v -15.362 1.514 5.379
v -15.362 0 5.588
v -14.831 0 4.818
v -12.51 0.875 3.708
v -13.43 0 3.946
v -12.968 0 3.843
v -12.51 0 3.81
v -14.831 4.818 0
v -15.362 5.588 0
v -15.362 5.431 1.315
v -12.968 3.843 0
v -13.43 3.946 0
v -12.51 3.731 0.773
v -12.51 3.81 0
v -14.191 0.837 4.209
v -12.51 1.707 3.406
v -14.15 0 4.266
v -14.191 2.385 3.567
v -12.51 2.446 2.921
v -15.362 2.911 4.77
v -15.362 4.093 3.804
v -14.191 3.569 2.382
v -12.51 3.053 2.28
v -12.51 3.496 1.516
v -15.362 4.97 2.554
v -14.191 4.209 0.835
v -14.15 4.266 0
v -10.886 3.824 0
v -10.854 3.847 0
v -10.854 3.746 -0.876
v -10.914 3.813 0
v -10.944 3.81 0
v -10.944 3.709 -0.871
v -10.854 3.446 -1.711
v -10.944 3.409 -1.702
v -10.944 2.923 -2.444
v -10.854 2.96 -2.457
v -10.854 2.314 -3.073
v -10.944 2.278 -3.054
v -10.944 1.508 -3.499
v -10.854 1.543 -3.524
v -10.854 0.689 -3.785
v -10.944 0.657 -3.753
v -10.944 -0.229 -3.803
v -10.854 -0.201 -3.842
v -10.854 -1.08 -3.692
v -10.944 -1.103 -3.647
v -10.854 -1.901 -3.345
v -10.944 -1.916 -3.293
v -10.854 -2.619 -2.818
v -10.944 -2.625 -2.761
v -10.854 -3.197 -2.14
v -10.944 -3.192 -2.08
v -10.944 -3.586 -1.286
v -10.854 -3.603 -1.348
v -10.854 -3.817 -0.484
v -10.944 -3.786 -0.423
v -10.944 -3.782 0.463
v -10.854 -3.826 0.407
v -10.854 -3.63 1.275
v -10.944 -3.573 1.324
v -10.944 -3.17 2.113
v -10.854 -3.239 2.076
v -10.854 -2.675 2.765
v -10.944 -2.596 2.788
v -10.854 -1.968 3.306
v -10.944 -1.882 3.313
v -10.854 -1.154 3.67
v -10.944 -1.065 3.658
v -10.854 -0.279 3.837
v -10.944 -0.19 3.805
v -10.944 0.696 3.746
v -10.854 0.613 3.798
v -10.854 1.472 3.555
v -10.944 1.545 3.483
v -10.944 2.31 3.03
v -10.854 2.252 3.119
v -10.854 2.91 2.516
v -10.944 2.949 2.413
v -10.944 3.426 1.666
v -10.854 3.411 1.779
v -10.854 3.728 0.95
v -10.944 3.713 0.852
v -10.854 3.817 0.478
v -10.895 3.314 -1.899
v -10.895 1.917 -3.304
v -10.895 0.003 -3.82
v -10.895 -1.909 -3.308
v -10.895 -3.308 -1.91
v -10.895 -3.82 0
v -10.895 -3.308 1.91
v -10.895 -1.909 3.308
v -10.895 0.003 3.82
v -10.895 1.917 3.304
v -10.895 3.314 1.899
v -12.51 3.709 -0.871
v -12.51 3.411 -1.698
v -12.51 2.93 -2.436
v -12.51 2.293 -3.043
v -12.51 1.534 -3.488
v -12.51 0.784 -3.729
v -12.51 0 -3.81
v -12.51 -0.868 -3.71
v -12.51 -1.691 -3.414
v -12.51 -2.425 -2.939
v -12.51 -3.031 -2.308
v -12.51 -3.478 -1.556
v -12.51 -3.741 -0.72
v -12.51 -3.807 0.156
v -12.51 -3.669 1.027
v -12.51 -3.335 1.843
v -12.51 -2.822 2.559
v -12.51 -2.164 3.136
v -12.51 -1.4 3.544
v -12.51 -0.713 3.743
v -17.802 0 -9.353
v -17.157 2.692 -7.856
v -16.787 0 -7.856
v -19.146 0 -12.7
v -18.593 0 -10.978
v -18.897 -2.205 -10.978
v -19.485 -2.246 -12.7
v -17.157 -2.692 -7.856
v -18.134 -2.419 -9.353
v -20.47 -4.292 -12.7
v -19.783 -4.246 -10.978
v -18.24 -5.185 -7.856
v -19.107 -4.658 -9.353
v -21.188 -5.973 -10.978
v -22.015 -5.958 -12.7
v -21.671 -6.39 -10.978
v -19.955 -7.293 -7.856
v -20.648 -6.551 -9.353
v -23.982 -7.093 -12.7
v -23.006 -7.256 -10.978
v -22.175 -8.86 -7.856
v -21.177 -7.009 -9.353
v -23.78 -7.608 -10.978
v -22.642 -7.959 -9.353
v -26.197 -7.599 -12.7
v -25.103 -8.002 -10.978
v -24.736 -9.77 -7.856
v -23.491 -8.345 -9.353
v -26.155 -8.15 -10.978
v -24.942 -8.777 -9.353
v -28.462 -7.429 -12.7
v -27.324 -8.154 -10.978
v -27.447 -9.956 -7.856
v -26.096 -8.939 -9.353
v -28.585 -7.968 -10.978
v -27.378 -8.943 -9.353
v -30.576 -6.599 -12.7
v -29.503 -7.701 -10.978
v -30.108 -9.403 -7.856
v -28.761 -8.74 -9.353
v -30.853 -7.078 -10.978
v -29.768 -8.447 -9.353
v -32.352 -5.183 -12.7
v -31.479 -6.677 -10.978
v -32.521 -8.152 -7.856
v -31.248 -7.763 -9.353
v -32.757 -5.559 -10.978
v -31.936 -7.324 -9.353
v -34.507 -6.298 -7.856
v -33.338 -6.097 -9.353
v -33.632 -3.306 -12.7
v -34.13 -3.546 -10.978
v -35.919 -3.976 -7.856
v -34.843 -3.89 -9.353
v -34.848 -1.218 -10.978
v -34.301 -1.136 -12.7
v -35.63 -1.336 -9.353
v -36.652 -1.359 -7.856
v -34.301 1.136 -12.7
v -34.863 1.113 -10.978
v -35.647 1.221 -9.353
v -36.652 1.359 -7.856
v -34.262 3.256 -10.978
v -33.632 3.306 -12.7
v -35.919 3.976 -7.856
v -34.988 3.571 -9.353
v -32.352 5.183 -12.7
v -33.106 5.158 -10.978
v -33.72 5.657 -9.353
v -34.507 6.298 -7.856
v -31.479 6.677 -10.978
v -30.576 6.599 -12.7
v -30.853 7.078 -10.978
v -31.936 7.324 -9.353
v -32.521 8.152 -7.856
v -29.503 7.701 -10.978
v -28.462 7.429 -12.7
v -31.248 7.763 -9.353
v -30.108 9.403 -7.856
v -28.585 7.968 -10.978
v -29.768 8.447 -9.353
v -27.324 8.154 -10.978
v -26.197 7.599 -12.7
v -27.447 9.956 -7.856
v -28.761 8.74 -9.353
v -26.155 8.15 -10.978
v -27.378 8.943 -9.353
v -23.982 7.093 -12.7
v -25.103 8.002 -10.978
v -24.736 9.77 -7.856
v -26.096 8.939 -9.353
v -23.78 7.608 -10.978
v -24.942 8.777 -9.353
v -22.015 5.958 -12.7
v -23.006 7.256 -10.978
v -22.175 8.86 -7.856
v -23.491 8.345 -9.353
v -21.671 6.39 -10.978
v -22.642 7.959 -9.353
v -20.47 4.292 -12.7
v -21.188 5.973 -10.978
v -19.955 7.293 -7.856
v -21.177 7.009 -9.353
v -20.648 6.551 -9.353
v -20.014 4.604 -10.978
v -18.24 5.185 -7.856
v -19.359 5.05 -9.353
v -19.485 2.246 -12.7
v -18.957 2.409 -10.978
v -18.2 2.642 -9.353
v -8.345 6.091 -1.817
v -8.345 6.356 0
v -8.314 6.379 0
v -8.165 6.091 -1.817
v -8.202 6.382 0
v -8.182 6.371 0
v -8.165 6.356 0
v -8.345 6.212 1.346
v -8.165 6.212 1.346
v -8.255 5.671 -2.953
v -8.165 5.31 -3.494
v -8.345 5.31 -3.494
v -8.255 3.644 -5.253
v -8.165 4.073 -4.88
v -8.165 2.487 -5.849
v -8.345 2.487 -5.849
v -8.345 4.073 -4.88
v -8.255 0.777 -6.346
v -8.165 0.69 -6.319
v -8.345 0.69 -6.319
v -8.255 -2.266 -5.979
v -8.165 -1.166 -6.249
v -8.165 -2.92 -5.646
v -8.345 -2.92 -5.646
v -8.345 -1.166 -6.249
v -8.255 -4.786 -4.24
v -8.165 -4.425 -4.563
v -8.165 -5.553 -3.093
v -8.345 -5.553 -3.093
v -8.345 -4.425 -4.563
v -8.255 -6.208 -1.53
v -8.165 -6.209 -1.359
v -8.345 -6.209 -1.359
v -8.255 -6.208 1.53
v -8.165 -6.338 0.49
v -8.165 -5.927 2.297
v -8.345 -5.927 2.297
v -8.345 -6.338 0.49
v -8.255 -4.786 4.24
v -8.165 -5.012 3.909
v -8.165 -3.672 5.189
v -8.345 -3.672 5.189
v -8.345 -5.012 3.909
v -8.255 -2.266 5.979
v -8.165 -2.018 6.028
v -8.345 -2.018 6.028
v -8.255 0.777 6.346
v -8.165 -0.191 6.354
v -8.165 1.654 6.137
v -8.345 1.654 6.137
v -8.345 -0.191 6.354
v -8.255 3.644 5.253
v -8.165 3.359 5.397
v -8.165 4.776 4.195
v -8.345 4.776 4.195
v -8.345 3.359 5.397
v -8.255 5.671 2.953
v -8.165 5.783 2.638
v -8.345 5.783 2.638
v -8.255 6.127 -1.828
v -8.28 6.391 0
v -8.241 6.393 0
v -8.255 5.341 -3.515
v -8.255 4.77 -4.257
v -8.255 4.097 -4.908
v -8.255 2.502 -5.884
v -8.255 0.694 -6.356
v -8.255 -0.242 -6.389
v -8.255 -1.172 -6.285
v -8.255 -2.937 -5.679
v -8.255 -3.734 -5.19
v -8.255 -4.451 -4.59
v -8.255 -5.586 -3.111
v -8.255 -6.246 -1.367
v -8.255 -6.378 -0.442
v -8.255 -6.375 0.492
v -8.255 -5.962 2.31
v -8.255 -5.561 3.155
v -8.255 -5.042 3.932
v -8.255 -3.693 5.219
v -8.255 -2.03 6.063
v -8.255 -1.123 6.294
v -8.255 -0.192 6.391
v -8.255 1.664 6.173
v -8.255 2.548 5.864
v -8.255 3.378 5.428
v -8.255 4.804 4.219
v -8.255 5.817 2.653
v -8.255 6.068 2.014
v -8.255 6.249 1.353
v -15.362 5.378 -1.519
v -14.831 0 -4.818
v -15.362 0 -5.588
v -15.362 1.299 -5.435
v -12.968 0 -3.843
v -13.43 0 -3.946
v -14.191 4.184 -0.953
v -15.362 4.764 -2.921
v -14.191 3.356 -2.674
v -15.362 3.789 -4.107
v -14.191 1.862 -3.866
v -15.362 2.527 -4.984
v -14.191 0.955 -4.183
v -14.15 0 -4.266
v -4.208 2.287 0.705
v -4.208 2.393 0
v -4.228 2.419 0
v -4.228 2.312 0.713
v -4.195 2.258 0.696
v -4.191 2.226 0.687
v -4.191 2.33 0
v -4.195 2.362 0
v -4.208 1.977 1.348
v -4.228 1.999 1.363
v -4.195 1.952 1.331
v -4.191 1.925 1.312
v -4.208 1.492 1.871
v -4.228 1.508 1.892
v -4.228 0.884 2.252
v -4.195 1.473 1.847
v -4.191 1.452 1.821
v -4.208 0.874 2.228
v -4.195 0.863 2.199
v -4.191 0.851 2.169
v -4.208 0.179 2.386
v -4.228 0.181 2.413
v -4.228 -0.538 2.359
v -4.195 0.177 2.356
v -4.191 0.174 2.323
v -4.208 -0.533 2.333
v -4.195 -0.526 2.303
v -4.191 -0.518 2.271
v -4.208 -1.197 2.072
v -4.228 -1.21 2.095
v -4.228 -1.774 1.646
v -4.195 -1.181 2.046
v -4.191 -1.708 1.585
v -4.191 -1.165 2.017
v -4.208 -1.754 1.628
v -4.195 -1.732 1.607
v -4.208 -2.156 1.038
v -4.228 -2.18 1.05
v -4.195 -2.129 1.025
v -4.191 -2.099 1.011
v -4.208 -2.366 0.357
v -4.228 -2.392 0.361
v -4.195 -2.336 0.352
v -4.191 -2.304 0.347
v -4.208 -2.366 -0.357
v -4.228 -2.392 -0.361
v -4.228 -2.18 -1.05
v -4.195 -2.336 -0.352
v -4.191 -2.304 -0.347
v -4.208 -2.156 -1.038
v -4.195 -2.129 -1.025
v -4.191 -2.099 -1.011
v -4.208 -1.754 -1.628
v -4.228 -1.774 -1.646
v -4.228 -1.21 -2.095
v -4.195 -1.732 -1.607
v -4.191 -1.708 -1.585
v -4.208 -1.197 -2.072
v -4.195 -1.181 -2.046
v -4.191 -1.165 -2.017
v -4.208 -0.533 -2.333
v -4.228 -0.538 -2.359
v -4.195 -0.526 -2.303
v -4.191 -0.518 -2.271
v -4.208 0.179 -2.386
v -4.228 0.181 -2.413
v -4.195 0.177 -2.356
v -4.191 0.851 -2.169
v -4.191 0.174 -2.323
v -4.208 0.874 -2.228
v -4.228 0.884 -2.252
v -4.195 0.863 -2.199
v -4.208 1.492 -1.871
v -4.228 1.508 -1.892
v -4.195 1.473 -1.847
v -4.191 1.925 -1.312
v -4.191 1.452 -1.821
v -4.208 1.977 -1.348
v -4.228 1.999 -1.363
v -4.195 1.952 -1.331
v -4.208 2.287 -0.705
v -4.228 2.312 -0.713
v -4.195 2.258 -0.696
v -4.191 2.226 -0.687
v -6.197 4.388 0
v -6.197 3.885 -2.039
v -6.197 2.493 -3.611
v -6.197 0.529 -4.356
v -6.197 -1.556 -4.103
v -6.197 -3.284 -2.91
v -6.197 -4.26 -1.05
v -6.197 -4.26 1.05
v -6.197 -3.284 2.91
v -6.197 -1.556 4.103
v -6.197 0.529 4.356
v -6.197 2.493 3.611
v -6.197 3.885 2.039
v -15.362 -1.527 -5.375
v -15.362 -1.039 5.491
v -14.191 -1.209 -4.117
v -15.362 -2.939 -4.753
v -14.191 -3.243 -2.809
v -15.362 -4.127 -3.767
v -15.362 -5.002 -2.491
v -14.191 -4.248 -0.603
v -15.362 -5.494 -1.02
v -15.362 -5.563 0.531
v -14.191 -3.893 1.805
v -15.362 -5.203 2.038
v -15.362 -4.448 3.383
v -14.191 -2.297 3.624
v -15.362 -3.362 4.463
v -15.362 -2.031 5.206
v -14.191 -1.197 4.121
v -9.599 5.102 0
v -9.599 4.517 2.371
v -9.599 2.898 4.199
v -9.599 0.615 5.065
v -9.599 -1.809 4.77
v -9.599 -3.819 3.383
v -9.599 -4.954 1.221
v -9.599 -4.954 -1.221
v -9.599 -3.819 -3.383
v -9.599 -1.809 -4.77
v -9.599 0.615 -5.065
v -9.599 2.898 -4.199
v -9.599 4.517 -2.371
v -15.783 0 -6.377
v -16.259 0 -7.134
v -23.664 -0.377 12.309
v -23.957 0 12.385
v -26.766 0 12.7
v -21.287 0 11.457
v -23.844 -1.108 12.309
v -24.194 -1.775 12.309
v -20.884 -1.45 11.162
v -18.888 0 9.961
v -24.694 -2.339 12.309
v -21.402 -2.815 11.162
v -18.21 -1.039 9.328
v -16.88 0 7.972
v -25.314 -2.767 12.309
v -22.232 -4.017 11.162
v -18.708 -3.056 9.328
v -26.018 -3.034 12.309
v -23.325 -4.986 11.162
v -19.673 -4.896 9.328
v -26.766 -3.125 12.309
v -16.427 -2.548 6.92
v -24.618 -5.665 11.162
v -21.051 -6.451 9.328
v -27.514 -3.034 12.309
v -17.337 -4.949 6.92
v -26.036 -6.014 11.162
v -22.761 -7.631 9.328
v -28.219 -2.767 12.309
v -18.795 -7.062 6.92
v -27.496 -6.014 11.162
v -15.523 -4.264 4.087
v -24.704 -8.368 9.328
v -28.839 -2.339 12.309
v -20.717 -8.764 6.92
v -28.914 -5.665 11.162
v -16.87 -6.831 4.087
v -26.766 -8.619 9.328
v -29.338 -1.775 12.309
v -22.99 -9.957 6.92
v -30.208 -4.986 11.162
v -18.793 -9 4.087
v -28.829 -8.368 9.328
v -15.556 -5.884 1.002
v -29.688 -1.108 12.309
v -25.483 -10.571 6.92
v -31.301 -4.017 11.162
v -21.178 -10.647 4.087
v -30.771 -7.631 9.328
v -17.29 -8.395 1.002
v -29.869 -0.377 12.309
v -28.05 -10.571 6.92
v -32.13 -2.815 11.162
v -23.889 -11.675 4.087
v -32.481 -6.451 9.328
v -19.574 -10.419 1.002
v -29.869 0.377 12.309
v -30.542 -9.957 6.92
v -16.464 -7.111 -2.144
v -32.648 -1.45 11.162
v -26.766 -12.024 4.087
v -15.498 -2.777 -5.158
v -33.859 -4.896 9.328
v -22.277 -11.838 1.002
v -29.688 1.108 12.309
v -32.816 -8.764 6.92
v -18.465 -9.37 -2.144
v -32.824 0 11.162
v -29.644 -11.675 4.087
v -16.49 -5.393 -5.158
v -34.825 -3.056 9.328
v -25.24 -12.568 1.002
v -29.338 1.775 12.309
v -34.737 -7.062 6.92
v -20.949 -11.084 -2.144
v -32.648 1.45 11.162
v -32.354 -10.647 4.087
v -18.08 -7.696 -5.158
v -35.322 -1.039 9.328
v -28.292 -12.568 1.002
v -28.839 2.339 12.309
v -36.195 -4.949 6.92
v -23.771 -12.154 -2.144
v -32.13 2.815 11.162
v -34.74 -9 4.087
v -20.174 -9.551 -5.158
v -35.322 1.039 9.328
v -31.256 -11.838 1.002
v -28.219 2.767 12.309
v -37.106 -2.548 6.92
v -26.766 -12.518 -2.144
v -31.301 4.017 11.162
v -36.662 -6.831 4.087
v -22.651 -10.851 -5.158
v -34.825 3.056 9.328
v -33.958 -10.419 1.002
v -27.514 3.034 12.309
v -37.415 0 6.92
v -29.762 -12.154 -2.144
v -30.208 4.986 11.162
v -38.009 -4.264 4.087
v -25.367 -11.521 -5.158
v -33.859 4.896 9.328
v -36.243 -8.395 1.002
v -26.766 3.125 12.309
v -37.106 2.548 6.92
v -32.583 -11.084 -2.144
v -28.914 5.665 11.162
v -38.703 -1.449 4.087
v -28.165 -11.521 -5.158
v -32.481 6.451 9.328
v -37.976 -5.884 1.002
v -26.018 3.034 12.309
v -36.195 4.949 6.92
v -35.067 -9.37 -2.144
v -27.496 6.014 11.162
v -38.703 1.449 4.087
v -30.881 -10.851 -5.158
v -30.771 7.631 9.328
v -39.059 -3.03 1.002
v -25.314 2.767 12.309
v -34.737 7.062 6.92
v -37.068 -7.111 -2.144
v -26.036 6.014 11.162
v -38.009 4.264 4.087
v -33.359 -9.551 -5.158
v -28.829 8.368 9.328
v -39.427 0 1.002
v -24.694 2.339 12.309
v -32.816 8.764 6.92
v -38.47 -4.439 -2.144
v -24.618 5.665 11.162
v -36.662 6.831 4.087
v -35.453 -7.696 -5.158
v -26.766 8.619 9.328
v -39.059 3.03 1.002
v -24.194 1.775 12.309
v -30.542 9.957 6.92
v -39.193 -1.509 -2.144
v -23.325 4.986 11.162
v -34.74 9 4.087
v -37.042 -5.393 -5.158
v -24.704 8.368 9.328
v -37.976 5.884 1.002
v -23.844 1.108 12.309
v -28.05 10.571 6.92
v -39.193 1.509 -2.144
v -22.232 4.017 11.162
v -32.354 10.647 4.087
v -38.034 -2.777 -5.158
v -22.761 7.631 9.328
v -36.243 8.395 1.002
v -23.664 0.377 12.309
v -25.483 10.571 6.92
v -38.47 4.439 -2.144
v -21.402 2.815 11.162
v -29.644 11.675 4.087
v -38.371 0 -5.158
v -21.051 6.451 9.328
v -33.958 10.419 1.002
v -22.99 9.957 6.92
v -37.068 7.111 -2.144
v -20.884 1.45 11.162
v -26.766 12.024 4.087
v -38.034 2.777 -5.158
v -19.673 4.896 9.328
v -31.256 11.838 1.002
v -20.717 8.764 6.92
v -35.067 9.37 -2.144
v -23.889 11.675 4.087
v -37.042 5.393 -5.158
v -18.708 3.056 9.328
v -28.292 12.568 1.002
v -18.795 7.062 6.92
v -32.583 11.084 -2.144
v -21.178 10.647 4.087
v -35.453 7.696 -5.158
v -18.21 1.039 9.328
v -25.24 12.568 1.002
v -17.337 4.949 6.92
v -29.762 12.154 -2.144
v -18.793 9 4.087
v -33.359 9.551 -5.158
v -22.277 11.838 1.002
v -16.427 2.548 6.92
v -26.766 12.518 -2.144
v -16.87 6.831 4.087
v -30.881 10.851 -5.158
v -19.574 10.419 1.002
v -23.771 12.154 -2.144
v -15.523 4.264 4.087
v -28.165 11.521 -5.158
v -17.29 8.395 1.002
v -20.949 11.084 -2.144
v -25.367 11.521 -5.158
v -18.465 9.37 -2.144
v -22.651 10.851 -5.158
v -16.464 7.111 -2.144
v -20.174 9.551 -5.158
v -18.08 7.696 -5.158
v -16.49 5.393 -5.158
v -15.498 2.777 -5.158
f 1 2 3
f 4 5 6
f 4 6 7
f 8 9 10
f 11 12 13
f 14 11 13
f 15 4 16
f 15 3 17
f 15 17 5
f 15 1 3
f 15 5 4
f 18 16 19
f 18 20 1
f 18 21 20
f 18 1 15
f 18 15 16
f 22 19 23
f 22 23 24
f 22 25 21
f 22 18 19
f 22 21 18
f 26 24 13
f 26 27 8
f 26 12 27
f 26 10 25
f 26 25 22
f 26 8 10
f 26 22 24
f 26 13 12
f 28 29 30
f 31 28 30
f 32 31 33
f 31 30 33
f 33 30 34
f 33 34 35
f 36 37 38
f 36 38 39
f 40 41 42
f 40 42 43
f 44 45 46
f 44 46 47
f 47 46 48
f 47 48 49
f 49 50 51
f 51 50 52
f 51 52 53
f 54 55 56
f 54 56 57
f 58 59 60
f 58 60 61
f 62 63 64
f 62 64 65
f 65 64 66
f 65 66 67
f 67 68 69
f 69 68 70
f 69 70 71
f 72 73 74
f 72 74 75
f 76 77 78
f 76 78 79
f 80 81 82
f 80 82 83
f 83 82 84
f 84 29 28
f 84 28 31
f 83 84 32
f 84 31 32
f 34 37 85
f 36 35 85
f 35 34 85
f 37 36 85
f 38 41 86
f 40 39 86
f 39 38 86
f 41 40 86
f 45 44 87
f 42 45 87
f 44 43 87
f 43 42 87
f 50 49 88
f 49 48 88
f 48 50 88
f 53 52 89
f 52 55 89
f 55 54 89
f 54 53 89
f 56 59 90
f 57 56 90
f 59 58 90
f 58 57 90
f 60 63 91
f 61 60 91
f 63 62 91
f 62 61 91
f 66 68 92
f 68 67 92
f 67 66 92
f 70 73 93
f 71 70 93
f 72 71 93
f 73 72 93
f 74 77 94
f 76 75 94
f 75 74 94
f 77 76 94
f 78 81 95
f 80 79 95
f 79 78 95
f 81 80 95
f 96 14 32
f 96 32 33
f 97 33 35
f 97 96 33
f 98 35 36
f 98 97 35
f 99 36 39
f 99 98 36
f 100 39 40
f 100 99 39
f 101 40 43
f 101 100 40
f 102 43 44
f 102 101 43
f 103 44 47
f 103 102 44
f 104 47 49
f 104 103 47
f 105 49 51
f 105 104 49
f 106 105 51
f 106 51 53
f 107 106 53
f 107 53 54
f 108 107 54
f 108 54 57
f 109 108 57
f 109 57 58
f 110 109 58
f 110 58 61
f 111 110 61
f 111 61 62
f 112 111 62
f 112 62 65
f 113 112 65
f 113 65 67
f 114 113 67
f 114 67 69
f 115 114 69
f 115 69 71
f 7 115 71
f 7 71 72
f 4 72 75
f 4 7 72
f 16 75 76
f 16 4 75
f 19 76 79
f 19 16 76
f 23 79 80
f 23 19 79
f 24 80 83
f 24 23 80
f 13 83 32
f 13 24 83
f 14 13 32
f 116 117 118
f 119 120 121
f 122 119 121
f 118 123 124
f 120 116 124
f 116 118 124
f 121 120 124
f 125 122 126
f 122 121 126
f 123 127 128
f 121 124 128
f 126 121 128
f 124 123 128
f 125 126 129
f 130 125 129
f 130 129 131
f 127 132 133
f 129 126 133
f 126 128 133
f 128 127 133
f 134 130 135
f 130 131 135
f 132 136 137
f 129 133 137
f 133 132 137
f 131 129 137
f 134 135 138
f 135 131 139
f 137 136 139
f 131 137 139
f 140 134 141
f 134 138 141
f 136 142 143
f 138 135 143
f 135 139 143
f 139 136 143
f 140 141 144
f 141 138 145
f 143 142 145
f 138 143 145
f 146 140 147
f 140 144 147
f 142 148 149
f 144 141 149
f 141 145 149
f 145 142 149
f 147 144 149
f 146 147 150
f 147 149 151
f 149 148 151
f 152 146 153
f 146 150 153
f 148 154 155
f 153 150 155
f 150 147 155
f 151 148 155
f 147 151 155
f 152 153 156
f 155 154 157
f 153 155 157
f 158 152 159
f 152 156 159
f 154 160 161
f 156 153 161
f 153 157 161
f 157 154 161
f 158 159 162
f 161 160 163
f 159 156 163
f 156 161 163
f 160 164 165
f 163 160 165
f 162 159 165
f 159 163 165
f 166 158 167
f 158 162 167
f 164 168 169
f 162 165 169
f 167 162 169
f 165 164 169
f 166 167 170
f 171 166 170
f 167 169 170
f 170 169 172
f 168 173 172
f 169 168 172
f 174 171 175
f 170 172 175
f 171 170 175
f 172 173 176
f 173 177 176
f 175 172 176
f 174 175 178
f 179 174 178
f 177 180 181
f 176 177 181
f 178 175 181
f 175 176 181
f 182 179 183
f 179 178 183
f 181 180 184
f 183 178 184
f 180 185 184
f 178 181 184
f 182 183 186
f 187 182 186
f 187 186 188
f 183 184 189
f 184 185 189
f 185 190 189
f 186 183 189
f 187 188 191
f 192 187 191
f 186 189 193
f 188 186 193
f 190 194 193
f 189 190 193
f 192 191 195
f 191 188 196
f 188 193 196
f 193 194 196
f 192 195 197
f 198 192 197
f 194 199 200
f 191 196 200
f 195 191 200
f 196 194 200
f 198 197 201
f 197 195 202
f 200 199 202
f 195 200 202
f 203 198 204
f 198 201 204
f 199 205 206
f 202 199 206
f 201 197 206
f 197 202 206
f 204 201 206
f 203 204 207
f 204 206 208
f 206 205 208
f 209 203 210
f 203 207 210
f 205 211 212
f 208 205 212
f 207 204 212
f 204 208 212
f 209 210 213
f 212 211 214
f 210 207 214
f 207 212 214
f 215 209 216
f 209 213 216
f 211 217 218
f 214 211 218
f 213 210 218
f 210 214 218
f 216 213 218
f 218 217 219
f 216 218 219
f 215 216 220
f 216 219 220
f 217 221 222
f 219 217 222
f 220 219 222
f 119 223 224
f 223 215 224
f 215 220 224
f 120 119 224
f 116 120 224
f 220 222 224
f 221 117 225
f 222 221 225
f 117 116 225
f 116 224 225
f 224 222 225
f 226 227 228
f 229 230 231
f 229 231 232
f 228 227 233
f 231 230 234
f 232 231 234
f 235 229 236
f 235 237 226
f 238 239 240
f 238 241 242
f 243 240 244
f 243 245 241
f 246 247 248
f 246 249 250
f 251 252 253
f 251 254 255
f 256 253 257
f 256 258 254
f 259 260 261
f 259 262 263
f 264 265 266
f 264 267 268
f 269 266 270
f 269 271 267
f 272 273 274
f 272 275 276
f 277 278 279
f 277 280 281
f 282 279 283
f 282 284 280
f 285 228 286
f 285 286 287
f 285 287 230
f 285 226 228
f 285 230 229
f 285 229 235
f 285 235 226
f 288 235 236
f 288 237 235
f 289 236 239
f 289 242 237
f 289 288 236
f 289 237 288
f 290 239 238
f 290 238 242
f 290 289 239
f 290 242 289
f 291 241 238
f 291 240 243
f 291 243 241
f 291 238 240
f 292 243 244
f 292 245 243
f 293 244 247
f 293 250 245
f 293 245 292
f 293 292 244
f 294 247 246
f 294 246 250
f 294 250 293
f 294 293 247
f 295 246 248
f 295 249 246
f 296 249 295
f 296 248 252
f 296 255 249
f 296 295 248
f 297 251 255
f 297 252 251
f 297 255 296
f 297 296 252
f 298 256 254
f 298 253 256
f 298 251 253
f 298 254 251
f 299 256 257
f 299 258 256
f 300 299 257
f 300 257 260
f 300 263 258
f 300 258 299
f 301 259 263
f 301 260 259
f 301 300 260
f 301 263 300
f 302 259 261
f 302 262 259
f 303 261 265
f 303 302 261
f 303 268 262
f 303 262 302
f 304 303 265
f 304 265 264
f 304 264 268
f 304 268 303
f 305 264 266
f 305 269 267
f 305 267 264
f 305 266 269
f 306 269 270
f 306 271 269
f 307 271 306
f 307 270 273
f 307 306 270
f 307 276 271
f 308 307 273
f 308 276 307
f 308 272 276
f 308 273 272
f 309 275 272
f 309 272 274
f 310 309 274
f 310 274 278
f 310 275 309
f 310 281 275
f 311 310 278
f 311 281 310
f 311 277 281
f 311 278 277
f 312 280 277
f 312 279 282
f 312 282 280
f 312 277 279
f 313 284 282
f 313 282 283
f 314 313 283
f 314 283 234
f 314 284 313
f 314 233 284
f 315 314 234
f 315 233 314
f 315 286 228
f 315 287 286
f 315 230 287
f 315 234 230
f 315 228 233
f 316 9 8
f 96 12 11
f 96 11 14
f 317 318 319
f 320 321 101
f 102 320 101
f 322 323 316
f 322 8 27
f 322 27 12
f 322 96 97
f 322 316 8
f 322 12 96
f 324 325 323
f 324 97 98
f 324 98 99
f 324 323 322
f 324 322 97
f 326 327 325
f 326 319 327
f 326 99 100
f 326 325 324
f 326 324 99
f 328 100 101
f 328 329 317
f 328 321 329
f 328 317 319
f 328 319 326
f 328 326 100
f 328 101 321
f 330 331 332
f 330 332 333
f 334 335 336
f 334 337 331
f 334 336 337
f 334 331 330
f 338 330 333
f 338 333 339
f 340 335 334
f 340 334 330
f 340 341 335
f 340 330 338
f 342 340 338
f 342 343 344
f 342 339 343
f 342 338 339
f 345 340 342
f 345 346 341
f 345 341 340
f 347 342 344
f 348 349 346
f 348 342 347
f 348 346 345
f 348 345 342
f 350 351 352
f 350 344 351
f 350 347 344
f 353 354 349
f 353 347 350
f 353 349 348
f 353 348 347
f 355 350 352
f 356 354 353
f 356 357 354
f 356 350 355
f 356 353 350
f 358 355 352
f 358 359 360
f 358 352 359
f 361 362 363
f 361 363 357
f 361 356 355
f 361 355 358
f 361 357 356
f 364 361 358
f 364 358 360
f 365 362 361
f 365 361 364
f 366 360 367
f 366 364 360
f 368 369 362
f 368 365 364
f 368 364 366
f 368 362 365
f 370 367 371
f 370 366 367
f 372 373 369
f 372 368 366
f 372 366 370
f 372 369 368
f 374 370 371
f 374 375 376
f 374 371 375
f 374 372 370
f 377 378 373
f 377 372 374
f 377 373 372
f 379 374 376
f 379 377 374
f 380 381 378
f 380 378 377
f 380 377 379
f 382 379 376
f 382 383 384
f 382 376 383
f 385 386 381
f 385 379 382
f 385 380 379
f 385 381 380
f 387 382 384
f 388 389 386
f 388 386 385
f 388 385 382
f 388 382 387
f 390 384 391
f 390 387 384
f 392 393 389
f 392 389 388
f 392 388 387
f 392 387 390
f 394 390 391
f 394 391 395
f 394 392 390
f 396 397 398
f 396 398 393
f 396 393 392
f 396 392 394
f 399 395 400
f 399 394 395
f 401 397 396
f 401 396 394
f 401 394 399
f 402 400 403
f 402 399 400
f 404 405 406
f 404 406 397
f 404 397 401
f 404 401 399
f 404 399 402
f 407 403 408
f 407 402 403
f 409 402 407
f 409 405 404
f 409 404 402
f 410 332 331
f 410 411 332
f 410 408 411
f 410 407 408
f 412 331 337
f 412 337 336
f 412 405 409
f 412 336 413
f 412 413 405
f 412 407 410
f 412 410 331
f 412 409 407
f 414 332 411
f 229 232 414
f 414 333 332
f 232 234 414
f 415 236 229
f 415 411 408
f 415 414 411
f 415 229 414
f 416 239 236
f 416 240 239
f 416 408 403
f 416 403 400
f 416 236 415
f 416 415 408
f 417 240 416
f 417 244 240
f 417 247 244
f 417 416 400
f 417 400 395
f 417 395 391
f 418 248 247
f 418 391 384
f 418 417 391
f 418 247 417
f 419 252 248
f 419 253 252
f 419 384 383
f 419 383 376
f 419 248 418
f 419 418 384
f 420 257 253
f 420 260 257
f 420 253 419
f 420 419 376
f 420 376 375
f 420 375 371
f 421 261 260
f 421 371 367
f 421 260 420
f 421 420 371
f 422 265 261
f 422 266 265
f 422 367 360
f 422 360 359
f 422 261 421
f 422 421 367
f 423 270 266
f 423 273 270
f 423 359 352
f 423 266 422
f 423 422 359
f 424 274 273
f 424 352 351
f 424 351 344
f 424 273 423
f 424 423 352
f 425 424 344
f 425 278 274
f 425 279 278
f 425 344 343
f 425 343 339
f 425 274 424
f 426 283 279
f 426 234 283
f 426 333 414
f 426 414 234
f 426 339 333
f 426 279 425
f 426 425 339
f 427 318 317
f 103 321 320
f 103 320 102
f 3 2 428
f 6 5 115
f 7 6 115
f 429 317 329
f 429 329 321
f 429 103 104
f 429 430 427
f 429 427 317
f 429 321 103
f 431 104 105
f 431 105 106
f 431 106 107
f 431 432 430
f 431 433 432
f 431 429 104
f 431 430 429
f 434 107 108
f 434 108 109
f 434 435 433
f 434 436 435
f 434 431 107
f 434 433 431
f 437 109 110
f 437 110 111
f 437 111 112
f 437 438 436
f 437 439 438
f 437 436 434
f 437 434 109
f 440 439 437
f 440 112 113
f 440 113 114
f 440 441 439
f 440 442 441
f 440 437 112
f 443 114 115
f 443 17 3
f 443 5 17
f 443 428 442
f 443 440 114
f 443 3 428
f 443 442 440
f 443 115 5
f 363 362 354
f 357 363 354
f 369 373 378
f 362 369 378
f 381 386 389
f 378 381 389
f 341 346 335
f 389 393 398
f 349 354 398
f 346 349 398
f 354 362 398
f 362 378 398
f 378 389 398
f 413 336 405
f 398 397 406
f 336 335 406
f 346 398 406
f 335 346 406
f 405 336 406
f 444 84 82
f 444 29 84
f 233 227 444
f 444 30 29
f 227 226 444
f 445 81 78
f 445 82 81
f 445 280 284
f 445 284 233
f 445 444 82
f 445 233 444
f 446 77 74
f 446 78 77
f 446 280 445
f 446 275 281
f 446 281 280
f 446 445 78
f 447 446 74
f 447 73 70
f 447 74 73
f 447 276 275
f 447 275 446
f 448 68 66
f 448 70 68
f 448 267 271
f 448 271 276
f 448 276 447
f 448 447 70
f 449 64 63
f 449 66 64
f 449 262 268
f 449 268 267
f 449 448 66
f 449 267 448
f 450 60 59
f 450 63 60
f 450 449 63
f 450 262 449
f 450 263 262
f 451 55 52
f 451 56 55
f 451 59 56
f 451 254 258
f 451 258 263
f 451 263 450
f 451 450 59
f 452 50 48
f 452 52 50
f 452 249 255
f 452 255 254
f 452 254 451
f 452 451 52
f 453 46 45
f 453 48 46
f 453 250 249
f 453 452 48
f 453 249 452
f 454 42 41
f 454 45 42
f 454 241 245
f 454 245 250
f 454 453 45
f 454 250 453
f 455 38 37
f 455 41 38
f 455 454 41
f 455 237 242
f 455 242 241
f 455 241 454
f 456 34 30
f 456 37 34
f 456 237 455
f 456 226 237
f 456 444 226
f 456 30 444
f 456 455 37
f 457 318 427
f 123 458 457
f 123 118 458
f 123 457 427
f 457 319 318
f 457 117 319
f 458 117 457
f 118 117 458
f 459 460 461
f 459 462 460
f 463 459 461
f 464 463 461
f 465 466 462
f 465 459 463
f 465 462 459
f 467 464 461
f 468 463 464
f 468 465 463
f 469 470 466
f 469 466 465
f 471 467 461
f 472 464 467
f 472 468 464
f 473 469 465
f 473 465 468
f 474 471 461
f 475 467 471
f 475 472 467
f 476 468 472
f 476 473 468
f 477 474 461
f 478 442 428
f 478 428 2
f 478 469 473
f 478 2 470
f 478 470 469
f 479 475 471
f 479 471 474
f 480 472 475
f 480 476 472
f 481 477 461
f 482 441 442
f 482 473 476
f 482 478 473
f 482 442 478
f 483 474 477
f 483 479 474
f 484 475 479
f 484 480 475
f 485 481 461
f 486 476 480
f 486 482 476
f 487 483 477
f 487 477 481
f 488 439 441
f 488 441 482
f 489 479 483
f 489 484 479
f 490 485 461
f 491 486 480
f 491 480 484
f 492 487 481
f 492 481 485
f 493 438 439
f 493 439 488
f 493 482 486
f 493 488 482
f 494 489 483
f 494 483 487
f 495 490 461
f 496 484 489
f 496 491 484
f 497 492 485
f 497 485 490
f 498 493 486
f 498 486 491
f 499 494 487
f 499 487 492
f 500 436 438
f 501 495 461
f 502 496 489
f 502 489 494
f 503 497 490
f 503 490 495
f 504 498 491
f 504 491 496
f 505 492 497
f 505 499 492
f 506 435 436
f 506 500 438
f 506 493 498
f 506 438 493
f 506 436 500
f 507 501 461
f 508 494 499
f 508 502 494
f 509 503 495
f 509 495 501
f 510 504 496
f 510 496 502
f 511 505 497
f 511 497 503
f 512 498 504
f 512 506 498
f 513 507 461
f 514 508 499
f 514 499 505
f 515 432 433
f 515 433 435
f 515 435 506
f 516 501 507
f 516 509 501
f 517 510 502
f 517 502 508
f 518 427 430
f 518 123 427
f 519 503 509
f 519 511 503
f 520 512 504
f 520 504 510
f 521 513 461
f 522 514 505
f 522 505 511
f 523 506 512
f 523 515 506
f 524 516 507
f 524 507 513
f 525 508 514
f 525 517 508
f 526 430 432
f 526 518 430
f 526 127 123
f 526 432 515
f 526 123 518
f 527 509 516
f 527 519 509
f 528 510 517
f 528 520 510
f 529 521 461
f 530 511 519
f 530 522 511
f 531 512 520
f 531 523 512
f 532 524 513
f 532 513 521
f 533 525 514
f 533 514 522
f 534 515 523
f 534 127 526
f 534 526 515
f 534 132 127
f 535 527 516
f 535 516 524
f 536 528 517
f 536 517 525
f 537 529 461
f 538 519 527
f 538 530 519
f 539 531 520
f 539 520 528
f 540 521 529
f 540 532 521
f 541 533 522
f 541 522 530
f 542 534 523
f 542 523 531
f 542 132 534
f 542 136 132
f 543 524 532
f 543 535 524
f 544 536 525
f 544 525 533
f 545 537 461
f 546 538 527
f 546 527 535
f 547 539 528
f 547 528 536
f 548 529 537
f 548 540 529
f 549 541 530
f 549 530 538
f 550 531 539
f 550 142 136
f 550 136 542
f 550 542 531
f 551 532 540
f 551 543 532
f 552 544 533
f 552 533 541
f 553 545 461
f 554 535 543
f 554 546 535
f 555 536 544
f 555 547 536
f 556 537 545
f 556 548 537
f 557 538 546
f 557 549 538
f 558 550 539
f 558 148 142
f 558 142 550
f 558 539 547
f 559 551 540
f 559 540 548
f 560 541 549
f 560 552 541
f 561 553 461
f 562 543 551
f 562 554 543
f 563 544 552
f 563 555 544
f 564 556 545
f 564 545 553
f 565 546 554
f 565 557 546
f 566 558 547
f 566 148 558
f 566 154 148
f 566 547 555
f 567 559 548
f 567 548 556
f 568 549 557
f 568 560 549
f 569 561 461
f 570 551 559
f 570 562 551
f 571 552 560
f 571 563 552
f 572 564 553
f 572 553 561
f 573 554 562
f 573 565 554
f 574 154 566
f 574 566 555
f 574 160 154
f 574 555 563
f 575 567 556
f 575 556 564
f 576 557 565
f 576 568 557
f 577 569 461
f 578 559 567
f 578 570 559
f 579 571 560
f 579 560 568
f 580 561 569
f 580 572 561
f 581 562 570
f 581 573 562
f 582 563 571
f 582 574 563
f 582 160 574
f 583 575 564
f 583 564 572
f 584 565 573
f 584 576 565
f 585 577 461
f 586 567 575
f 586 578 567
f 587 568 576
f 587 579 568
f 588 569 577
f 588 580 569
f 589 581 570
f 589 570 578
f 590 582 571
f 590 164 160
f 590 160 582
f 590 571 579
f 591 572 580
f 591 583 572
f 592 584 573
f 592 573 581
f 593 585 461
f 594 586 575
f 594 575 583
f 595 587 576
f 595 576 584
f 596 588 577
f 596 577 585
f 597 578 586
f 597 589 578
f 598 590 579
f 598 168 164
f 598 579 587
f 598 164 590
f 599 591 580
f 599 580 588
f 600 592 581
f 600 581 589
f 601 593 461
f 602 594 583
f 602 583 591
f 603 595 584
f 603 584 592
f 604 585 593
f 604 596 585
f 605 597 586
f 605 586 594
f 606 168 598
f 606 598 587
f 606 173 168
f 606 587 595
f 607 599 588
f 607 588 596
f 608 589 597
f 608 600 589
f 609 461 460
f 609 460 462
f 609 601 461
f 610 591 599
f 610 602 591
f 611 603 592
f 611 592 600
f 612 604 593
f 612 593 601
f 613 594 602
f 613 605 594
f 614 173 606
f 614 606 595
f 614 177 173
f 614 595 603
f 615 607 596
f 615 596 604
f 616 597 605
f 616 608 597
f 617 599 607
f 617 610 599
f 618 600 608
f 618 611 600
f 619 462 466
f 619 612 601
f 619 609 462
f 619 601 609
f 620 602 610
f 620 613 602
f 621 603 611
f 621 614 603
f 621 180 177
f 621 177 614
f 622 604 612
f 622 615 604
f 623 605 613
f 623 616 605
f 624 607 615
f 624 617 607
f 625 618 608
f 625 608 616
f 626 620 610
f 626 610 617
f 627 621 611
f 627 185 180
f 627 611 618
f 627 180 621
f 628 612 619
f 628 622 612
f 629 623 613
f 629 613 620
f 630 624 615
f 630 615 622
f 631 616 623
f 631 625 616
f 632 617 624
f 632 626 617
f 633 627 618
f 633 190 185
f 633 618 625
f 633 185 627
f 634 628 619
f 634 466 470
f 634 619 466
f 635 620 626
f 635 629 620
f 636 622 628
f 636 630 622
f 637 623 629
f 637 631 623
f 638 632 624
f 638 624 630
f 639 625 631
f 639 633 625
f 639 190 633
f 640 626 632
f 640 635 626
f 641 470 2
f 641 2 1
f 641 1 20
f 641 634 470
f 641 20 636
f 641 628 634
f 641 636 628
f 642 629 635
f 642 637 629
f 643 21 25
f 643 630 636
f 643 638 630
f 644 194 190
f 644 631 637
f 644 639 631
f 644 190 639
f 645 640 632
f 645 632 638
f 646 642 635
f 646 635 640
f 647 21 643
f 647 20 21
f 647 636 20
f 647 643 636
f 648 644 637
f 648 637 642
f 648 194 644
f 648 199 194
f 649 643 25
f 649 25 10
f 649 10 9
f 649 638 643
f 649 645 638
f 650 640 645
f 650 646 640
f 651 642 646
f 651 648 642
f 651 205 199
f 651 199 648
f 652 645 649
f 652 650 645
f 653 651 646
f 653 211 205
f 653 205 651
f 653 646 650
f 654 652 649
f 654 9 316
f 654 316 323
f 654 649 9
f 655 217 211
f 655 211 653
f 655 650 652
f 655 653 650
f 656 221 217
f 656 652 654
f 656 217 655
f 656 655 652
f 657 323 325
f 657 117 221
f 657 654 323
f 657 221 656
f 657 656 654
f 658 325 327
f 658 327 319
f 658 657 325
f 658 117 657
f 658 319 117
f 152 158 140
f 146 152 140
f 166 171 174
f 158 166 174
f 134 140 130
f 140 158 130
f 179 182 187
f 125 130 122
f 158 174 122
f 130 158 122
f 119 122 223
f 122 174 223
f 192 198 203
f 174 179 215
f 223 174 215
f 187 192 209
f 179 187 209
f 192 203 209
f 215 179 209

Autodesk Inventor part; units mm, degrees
ref_plane "YZ Plane" through (0, 0, 0) normal (1, 0, 0) x (0, 1, 0)
ref_plane "XZ Plane" through (0, 0, 0) normal (0, 1, 0) x (-1, 0, 0)
sketch "Sketch3" plane through (0, 0, 0) normal (0, 0, 1) x (1, 0, 0)
  line L0 (-10.8841, 4.3559) -> (-10.16, 5.08)
  line L1 (-7.62, -2.54) -> (-10.16, -5.08)
  line L2 (-10.16, -5.08) -> (-10.8841, -4.3559)
  line L3 (-10.8912, 3.81) -> (-8.255, 6.4462)
  line L4 (-8.255, 6.4462) -> (-4.191, 2.3822)
  line L5 (-4.191, 2.3822) -> (-4.191, 0)
  line L6 (-4.191, 0) -> (-16.6062, 0)
  line L7 (-10.8912, 3.81) -> (-16.6062, 3.81)
  line L8 (-16.6062, 3.81) -> (-16.6062, 0)
  line L9 (-10.8841, 4.3559) -> (-9.525, 5.715)
  line L10 (-9.525, -5.715) -> (-10.8841, -4.3559)
  line L11 (-8.255, 6.985) -> (-3.81, 2.54)
  line L12 (-3.81, 2.54) -> (-3.81, -2.54)
  line L13 (-3.81, -2.54) -> (-8.255, -6.985)
  point P0 (0, 0)
  point P1 (-7.62, 0)
  dimension "d5" = 0.381
  dimension "d12" = 5.715
  dimension "d13" = 3.81
  dimension "d26" = 0.381
  dimension "d27" = 0.381
revolve "Revolution2" add sketch "Sketch3" angle 360 about axis through (-4.191, 0, 0) along (-1, 0, 0)
fillet "Fillet2" radius 0.127 3 edges at (-8.255, -6.4462, 0) (-10.8912, -3.81, 0) (-4.191, -2.3822, 0)
sketch "Sketch5" plane through (0, 0, 0) normal (0, 1, 0) x (-1, 0, 0)
  line L0 (16.6062, 3.81) -> (16.6062, -3.81) projected
  line L1 (16.6062, 3.81) -> (16.6062, -3.81) projected
  line L2 (10.9438, 3.81) -> (10.9438, -3.81) projected
  arc A0 (26.7662, 12.7) -> (26.7662, -12.7) centre (26.7662, 0) ccw
  line L3 (26.7662, 12.7) -> (26.7662, -12.7)
  point P0 (0, 0)
  dimension "d14" = 25.4
  dimension "d15" = 2.54
revolve "Revolution3" add sketch "Sketch5" angle 360 about axis through (-26.7662, 0, 12.7) along (0, 0, -1)
ref_plane "Work Plane1" through (0, 0, -12.7) normal (0, 0, 1) x (1, 0, 0)
sketch "Sketch8" plane through (0, 0, -12.7) normal (0, 0, 1) x (1, 0, 0)
  line L0 (-14.6512, -3.81) -> (-14.6512, 3.81) projected
  arc A0 (-14.6512, 3.81) -> (-14.6512, -3.81) centre (-26.7662, 0) ccw projected
  circle A1 centre (-26.7662, 0) radius 7.62
  arc A2 (-6.8635, -3.3102) -> (-6.8635, 3.3102) centre (0, 0) ccw projected
extrude "Extrusion1" add sketch "Sketch8" along normal up to next contours A1
fillet "Fillet3" radius 12.7 1 edges at (-34.3862, 0, -10.16)
fillet "Fillet4" radius 3.175 3 edges at (-14.6512, -3.81, 0) (-14.6512, 2.6939, 2.6943) (-14.6512, 2.6939, -2.6943)
equation "\"d26\" = d5"
equation "\"d27\" = d5"
properties part number "The Thing"
